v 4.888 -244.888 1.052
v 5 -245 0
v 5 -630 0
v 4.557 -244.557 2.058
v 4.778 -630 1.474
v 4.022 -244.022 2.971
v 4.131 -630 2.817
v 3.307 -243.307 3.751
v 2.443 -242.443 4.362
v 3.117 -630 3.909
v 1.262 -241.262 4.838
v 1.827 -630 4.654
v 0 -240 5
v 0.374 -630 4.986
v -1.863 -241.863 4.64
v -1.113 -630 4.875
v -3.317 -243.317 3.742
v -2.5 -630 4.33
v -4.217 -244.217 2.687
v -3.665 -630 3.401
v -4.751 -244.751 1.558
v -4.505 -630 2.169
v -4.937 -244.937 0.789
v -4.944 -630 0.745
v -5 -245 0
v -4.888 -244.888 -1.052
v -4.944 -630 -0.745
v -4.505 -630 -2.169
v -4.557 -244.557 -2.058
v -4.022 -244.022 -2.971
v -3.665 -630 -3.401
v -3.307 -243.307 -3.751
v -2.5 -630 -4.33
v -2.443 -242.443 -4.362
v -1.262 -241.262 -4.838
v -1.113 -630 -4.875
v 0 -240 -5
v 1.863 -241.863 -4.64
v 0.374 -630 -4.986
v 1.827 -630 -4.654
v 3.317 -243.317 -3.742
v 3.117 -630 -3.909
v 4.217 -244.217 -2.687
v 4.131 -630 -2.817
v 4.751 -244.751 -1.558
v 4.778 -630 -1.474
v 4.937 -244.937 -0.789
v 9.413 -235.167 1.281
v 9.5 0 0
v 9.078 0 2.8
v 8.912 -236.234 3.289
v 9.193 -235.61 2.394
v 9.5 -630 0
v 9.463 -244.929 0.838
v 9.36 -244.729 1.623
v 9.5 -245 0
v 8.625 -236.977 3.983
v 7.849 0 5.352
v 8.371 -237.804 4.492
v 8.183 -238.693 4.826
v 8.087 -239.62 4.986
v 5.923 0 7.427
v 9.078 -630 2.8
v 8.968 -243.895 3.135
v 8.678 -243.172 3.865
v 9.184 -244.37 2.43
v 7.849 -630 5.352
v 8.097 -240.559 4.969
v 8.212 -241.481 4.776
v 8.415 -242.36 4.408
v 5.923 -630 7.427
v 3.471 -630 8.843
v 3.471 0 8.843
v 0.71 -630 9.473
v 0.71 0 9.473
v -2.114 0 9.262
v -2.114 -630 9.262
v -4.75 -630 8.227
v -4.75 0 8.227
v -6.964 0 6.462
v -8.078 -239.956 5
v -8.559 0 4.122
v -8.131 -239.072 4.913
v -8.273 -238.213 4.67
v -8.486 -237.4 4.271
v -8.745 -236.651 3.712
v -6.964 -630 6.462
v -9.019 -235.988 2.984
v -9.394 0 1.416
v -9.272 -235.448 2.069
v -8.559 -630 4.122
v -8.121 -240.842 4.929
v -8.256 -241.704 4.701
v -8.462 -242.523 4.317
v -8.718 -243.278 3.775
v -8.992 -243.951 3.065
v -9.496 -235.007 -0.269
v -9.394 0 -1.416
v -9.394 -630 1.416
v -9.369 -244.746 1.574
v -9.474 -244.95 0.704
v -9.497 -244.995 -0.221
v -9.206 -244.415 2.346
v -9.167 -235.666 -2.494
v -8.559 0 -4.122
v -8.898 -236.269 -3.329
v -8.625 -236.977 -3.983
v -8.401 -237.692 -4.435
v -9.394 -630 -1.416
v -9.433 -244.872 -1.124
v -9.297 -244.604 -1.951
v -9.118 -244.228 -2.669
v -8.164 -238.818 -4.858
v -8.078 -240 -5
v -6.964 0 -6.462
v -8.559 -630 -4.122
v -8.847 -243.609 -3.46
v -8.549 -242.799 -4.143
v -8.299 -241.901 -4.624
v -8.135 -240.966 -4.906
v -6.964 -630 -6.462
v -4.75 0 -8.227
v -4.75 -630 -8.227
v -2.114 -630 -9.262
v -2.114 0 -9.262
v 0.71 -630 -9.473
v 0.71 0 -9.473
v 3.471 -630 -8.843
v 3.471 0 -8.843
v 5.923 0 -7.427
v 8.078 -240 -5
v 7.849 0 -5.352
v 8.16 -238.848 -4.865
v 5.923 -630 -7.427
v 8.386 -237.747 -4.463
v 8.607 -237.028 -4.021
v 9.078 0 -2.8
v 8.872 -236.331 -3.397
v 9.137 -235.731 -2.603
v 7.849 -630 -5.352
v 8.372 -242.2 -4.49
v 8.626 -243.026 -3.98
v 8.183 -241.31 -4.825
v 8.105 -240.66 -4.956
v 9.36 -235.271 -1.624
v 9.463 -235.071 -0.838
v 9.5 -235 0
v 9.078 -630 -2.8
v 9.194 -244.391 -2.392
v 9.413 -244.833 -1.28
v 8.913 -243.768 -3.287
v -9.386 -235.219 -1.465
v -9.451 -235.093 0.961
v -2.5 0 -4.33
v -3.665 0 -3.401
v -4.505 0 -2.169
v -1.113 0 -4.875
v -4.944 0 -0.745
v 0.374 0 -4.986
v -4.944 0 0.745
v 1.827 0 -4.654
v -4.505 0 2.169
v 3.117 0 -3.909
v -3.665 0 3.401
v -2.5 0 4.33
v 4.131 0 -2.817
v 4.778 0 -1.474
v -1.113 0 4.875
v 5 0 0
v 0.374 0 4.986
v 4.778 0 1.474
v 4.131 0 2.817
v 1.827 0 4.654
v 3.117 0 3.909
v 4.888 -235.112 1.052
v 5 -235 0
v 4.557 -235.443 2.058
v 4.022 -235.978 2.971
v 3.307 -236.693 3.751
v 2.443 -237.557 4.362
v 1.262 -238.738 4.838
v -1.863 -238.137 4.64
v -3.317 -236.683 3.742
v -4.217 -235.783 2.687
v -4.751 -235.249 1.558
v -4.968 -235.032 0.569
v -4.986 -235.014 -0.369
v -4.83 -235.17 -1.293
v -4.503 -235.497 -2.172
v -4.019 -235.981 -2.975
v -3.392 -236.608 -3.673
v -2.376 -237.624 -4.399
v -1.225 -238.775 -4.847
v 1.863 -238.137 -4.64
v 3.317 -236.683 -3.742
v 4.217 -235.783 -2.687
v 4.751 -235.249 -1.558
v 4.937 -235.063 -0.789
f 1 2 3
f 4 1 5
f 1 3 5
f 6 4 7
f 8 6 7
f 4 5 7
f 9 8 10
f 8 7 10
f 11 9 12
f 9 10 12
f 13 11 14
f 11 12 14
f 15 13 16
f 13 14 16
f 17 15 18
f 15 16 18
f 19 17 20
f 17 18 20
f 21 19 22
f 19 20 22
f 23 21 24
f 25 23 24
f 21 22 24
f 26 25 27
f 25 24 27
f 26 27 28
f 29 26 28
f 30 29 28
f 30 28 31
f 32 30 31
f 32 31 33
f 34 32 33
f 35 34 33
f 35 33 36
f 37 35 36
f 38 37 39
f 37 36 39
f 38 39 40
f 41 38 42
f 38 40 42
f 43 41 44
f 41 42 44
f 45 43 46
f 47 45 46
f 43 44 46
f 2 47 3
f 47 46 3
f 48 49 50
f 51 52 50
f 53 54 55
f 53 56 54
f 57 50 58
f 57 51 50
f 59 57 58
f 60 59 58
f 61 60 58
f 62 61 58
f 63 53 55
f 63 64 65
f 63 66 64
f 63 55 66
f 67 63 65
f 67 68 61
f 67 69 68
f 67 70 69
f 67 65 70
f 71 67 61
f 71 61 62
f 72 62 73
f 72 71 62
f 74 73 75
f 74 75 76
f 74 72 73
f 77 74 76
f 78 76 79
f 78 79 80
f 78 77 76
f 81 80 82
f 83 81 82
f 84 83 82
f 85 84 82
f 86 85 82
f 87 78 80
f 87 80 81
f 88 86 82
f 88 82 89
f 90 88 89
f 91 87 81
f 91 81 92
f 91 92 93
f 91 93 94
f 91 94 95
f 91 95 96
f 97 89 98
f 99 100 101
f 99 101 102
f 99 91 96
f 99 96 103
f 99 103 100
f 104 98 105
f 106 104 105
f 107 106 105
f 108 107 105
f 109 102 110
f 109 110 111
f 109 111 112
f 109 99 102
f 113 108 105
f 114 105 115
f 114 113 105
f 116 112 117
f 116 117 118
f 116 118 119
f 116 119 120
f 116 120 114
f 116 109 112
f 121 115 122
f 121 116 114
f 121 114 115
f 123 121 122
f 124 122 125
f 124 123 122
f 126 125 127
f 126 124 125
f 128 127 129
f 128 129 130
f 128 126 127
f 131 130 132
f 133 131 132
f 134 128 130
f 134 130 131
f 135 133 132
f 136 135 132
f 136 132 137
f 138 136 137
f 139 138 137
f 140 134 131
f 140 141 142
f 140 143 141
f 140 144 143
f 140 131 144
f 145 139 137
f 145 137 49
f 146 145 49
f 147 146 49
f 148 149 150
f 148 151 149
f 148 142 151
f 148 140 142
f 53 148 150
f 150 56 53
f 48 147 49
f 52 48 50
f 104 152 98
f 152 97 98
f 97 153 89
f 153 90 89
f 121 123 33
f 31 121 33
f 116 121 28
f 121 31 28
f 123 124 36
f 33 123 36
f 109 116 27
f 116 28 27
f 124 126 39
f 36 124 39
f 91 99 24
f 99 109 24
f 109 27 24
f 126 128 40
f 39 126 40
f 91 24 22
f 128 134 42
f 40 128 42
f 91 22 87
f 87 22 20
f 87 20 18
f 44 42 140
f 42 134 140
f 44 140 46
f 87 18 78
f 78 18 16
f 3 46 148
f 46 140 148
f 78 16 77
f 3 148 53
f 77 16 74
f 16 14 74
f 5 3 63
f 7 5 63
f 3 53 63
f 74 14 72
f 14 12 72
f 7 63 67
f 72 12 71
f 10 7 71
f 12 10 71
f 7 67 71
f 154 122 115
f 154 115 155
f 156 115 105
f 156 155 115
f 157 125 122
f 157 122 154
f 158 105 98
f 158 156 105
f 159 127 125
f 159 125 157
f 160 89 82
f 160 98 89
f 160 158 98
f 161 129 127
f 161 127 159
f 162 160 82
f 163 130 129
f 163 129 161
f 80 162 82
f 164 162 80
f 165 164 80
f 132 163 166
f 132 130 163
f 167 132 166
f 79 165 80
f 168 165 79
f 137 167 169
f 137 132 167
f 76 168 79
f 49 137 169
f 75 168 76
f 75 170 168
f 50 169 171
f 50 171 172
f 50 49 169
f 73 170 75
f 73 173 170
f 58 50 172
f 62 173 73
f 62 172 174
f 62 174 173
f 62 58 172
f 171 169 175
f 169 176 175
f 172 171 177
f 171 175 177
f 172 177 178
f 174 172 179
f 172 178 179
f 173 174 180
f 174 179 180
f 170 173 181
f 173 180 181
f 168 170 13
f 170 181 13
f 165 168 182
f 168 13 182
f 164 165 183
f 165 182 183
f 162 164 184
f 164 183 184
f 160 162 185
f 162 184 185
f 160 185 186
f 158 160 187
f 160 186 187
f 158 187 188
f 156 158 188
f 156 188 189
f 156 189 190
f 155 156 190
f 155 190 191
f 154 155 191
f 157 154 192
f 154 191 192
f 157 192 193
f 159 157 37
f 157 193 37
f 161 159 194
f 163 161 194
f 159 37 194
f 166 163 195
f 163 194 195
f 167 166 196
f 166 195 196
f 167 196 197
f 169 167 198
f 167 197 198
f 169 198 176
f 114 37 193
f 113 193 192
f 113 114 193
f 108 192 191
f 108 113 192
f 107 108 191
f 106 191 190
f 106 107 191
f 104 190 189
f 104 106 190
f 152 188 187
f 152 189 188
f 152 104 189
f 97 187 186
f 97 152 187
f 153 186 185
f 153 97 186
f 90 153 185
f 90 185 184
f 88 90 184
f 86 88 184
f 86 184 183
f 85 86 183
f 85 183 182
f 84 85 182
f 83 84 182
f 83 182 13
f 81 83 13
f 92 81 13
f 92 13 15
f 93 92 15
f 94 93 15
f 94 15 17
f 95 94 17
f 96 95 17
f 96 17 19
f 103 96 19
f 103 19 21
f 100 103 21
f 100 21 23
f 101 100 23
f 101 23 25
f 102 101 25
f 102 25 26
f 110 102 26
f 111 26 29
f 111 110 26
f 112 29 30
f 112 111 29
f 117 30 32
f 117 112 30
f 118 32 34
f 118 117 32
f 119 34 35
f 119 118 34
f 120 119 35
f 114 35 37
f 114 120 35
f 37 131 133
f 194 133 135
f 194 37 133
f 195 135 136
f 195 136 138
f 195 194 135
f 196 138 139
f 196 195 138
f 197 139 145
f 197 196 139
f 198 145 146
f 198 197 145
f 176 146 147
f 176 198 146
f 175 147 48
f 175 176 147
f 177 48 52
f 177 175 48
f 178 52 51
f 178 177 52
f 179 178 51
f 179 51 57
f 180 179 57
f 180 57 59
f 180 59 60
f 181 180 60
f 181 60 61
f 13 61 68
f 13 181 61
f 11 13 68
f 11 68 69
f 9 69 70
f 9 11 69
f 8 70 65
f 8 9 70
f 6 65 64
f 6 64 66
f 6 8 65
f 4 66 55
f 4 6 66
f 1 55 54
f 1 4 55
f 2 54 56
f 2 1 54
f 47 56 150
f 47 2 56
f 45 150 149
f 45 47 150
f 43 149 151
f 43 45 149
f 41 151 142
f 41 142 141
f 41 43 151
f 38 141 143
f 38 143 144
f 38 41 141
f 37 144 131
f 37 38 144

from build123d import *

# Parameters (mm, degrees)
SKETCH_2_R               = 9.5
SKETCH_2_R_2             = 5
CUT_EXTRUDE_1_DEPTH      = 631.143237685
CUT_EXTRUDE_1_DEPTH_BACK = 631.143237685
SKETCH_3_R               = 5


with BuildPart() as part:
    # По траектории1: sweep along a path in Эскиз1
    with BuildLine(Plane.XY) as sweep_1_path:
        Line((0, 0), (0, -630))
    # Эскиз2 → По траектории1 (sweep)
    with BuildSketch(Plane(origin=(0, 0, 0), x_dir=(1, 0, 0), z_dir=(0, 1, 0))):
        Circle(SKETCH_2_R)
        Circle(SKETCH_2_R_2, mode=Mode.SUBTRACT)
    sweep(path=sweep_1_path.line)

    # Эскиз3 → Вырез-Вытянуть1 (cut, two sides: drawn at the far end of the back side and taken through both)
    with BuildSketch(Plane(origin=(0, 0, 0), x_dir=(0, 0, -1), z_dir=(1, 0, 0)).offset(-CUT_EXTRUDE_1_DEPTH_BACK)):
        with Locations((0, -240)):
            Circle(SKETCH_3_R)
    extrude(amount=CUT_EXTRUDE_1_DEPTH + CUT_EXTRUDE_1_DEPTH_BACK, mode=Mode.SUBTRACT)


solid = part.part
